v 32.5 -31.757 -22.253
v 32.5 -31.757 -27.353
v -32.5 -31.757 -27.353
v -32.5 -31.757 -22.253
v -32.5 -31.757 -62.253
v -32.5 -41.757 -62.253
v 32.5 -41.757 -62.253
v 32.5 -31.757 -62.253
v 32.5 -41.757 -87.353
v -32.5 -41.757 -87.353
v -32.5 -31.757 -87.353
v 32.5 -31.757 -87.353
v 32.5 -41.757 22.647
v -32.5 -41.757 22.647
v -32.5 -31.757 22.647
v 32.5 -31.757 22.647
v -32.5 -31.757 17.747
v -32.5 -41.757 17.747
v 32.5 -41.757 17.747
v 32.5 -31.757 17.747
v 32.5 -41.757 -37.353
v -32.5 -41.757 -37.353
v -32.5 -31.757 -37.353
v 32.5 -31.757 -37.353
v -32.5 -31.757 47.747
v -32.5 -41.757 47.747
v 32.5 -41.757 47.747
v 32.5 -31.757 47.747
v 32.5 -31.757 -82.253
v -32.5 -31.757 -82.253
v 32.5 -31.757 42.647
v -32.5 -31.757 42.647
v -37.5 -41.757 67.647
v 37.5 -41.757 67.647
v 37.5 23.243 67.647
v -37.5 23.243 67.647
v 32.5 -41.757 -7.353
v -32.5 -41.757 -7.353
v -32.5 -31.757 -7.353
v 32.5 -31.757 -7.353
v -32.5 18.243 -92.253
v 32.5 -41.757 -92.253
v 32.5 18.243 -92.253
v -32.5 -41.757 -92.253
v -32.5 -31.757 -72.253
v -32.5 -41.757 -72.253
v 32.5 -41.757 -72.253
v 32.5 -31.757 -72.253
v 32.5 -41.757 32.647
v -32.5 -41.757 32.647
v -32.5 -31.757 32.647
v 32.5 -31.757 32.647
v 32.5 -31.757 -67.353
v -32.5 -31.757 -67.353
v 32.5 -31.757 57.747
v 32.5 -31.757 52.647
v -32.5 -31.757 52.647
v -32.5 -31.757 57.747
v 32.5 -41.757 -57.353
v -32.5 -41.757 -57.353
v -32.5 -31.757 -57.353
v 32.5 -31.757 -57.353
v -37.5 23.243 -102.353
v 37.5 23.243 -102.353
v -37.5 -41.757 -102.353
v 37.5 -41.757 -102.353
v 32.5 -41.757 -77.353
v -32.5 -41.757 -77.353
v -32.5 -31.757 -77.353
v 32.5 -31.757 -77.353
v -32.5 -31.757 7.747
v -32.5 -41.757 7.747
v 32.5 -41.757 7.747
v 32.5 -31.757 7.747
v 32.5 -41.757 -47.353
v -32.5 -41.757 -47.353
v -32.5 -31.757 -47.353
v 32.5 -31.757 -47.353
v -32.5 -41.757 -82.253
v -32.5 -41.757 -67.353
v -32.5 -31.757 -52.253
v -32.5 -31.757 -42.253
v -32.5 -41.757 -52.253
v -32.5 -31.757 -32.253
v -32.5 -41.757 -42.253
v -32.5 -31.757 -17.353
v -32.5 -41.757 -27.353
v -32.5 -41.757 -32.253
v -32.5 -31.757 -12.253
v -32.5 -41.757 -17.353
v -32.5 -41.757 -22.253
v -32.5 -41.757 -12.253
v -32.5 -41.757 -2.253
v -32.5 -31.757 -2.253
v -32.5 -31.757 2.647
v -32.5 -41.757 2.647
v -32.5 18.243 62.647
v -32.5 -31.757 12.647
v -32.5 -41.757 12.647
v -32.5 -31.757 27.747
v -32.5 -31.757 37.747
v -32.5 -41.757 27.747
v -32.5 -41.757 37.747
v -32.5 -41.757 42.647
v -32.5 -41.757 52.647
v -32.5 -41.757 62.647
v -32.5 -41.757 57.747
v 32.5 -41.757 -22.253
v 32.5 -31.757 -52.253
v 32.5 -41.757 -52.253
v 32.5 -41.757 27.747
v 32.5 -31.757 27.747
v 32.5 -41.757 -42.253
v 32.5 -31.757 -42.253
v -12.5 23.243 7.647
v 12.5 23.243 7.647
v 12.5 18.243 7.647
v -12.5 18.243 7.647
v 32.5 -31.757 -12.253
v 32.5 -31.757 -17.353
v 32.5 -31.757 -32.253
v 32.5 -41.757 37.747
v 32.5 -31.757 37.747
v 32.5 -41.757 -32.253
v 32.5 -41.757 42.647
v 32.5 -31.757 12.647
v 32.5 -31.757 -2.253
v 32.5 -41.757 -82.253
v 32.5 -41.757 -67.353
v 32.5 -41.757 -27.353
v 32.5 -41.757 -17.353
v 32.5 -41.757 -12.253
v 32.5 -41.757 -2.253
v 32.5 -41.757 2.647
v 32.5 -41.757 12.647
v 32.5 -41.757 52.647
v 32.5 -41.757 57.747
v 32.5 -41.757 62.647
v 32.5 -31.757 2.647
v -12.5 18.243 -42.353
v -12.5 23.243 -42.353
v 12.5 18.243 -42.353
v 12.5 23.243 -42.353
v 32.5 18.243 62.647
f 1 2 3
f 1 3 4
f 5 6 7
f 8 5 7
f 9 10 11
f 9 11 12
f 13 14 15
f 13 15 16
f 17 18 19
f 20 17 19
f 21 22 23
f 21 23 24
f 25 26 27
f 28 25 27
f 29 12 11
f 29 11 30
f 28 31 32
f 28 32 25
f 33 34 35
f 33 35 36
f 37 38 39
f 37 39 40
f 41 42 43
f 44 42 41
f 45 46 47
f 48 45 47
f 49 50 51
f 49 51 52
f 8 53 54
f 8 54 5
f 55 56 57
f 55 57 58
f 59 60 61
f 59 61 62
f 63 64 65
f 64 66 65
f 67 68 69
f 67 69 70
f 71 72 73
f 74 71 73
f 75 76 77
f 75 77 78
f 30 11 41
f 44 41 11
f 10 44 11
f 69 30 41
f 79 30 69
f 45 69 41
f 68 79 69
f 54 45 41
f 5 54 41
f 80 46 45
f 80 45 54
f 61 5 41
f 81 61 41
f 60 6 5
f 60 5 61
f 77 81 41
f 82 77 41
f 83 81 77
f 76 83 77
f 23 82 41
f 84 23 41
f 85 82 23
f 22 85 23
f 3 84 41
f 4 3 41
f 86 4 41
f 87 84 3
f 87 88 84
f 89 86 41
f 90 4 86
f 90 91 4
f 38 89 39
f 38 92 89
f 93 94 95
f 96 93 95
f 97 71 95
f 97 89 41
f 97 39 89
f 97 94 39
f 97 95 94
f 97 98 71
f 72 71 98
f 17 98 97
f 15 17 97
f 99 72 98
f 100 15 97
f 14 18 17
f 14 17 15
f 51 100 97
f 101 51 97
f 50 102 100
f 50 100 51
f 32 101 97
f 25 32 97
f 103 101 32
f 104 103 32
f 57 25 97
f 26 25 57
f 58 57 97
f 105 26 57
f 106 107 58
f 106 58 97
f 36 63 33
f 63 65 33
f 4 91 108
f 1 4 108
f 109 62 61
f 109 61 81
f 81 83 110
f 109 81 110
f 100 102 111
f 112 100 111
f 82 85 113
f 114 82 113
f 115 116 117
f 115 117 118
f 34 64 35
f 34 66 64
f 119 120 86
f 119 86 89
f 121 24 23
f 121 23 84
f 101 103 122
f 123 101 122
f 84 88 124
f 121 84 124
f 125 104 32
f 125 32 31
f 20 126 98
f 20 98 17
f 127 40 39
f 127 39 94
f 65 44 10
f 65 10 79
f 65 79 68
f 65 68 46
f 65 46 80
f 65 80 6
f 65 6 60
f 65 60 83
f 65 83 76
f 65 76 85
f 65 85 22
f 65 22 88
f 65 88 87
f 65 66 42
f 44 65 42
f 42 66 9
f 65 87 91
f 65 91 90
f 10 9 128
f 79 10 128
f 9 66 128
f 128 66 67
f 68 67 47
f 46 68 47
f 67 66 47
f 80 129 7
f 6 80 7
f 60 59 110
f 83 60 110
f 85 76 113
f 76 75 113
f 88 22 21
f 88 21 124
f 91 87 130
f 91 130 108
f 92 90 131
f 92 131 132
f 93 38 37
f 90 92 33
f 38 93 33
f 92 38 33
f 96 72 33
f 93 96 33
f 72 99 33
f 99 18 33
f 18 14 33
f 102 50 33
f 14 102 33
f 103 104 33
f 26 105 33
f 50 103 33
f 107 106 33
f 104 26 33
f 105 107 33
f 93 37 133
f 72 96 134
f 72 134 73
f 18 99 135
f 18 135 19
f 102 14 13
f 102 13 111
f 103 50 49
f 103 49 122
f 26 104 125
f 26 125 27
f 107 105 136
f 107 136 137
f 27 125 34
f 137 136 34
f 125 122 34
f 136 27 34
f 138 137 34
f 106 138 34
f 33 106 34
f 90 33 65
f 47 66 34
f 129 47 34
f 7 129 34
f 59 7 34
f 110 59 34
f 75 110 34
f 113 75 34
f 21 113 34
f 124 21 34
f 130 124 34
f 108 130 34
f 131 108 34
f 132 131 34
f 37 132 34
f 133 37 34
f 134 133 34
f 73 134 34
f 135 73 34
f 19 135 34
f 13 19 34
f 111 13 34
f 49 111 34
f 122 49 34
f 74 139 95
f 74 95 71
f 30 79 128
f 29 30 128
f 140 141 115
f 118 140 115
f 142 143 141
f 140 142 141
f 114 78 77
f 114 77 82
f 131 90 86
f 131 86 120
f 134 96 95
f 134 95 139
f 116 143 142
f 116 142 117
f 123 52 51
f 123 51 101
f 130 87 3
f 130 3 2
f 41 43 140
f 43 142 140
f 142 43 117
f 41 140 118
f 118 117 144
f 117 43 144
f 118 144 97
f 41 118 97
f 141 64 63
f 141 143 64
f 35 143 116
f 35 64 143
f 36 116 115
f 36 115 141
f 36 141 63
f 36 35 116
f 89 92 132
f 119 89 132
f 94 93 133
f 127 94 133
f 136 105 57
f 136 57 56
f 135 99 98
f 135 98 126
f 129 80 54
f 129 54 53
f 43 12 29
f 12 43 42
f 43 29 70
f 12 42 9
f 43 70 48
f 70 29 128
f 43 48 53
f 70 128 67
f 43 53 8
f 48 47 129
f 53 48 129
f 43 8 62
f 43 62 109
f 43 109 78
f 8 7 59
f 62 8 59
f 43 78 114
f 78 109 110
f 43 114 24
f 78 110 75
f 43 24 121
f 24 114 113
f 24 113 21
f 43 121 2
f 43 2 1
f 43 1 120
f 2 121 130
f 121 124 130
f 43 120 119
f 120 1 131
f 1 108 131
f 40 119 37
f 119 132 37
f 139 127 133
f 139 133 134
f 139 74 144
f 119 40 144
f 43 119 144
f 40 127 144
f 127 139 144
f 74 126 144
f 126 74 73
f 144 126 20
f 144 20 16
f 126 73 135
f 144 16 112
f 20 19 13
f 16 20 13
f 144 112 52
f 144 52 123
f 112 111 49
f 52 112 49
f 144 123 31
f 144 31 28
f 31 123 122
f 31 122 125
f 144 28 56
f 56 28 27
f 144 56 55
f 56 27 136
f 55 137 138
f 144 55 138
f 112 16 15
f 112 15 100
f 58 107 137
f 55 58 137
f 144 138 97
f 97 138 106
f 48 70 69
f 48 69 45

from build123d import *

# Parameters (mm, degrees)
F0_W     = 10
F0_H     = 170
F1_DEPTH = 37.5
F2_W     = 65
F2_H     = 4.9
F3_DEPTH = 10
F4_W     = 75
F4_H     = 170
F4_W_2   = 65
F4_H_2   = 154.9
F5_DEPTH = 50
F6_W     = 75
F6_H     = 170
F7_DEPTH = 5
F8_W     = 25
F8_H     = 50
F9_DEPTH = 5


with BuildPart() as f1:
    # F0 (on Right) → F1 (new body, symmetric)
    with BuildSketch(Plane.YZ):
        with Locations((-36.757313, -17.352806)):
            Rectangle(F0_W, F0_H)
    extrude(amount=F1_DEPTH, both=True)

    # F2 (on face) → F3 (cut, through all)
    with BuildSketch(Plane.XZ.offset(41.757313)):
        with Locations((0, 60.197194)):
            Rectangle(F2_W, F2_H)
        with Locations((0, 50.197194)):
            Rectangle(F2_W, F2_H)
        with Locations((0, 40.197194)):
            Rectangle(F2_W, F2_H)
        with Locations((0, 30.197194)):
            Rectangle(F2_W, F2_H)
        with Locations((0, 20.197194)):
            Rectangle(F2_W, F2_H)
        with Locations((0, 10.197194)):
            Rectangle(F2_W, F2_H)
        with Locations((0, 0.197194)):
            Rectangle(F2_W, F2_H)
        with Locations((0, -9.802806)):
            Rectangle(F2_W, F2_H)
        with Locations((0, -19.802806)):
            Rectangle(F2_W, F2_H)
        with Locations((0, -29.802806)):
            Rectangle(F2_W, F2_H)
        with Locations((0, -39.802806)):
            Rectangle(F2_W, F2_H)
        with Locations((0, -49.802806)):
            Rectangle(F2_W, F2_H)
        with Locations((0, -59.802806)):
            Rectangle(F2_W, F2_H)
        with Locations((0, -69.802806)):
            Rectangle(F2_W, F2_H)
        with Locations((0, -79.802806)):
            Rectangle(F2_W, F2_H)
        with Locations((0, -89.802806)):
            Rectangle(F2_W, F2_H)
    extrude(amount=-F3_DEPTH, mode=Mode.SUBTRACT)

    # F4 (on face) → F5 (join)
    with BuildSketch(Plane(origin=(0, -31.757313, 0), x_dir=(-1, 0, 0), z_dir=(0, 1, 0))):
        with Locations((0, -17.352806)):
            Rectangle(F4_W, F4_H)
        with Locations((0, -14.802806)):
            Rectangle(F4_W_2, F4_H_2, mode=Mode.SUBTRACT)
    extrude(amount=F5_DEPTH)

    # F6 (on face) → F7 (join)
    with BuildSketch(Plane(origin=(0, 18.242687, 0), x_dir=(-1, 0, 0), z_dir=(0, 1, 0))):
        with Locations((0, -17.352806)):
            Rectangle(F6_W, F6_H)
    extrude(amount=F7_DEPTH)

    # F8 (on face) → F9 (cut, through all)
    with BuildSketch(Plane(origin=(0, 23.242687, 0), x_dir=(-1, 0, 0), z_dir=(0, 1, 0))):
        with Locations((0, -17.352806)):
            Rectangle(F8_W, F8_H)
    extrude(amount=-F9_DEPTH, mode=Mode.SUBTRACT)


solid = f1.part
